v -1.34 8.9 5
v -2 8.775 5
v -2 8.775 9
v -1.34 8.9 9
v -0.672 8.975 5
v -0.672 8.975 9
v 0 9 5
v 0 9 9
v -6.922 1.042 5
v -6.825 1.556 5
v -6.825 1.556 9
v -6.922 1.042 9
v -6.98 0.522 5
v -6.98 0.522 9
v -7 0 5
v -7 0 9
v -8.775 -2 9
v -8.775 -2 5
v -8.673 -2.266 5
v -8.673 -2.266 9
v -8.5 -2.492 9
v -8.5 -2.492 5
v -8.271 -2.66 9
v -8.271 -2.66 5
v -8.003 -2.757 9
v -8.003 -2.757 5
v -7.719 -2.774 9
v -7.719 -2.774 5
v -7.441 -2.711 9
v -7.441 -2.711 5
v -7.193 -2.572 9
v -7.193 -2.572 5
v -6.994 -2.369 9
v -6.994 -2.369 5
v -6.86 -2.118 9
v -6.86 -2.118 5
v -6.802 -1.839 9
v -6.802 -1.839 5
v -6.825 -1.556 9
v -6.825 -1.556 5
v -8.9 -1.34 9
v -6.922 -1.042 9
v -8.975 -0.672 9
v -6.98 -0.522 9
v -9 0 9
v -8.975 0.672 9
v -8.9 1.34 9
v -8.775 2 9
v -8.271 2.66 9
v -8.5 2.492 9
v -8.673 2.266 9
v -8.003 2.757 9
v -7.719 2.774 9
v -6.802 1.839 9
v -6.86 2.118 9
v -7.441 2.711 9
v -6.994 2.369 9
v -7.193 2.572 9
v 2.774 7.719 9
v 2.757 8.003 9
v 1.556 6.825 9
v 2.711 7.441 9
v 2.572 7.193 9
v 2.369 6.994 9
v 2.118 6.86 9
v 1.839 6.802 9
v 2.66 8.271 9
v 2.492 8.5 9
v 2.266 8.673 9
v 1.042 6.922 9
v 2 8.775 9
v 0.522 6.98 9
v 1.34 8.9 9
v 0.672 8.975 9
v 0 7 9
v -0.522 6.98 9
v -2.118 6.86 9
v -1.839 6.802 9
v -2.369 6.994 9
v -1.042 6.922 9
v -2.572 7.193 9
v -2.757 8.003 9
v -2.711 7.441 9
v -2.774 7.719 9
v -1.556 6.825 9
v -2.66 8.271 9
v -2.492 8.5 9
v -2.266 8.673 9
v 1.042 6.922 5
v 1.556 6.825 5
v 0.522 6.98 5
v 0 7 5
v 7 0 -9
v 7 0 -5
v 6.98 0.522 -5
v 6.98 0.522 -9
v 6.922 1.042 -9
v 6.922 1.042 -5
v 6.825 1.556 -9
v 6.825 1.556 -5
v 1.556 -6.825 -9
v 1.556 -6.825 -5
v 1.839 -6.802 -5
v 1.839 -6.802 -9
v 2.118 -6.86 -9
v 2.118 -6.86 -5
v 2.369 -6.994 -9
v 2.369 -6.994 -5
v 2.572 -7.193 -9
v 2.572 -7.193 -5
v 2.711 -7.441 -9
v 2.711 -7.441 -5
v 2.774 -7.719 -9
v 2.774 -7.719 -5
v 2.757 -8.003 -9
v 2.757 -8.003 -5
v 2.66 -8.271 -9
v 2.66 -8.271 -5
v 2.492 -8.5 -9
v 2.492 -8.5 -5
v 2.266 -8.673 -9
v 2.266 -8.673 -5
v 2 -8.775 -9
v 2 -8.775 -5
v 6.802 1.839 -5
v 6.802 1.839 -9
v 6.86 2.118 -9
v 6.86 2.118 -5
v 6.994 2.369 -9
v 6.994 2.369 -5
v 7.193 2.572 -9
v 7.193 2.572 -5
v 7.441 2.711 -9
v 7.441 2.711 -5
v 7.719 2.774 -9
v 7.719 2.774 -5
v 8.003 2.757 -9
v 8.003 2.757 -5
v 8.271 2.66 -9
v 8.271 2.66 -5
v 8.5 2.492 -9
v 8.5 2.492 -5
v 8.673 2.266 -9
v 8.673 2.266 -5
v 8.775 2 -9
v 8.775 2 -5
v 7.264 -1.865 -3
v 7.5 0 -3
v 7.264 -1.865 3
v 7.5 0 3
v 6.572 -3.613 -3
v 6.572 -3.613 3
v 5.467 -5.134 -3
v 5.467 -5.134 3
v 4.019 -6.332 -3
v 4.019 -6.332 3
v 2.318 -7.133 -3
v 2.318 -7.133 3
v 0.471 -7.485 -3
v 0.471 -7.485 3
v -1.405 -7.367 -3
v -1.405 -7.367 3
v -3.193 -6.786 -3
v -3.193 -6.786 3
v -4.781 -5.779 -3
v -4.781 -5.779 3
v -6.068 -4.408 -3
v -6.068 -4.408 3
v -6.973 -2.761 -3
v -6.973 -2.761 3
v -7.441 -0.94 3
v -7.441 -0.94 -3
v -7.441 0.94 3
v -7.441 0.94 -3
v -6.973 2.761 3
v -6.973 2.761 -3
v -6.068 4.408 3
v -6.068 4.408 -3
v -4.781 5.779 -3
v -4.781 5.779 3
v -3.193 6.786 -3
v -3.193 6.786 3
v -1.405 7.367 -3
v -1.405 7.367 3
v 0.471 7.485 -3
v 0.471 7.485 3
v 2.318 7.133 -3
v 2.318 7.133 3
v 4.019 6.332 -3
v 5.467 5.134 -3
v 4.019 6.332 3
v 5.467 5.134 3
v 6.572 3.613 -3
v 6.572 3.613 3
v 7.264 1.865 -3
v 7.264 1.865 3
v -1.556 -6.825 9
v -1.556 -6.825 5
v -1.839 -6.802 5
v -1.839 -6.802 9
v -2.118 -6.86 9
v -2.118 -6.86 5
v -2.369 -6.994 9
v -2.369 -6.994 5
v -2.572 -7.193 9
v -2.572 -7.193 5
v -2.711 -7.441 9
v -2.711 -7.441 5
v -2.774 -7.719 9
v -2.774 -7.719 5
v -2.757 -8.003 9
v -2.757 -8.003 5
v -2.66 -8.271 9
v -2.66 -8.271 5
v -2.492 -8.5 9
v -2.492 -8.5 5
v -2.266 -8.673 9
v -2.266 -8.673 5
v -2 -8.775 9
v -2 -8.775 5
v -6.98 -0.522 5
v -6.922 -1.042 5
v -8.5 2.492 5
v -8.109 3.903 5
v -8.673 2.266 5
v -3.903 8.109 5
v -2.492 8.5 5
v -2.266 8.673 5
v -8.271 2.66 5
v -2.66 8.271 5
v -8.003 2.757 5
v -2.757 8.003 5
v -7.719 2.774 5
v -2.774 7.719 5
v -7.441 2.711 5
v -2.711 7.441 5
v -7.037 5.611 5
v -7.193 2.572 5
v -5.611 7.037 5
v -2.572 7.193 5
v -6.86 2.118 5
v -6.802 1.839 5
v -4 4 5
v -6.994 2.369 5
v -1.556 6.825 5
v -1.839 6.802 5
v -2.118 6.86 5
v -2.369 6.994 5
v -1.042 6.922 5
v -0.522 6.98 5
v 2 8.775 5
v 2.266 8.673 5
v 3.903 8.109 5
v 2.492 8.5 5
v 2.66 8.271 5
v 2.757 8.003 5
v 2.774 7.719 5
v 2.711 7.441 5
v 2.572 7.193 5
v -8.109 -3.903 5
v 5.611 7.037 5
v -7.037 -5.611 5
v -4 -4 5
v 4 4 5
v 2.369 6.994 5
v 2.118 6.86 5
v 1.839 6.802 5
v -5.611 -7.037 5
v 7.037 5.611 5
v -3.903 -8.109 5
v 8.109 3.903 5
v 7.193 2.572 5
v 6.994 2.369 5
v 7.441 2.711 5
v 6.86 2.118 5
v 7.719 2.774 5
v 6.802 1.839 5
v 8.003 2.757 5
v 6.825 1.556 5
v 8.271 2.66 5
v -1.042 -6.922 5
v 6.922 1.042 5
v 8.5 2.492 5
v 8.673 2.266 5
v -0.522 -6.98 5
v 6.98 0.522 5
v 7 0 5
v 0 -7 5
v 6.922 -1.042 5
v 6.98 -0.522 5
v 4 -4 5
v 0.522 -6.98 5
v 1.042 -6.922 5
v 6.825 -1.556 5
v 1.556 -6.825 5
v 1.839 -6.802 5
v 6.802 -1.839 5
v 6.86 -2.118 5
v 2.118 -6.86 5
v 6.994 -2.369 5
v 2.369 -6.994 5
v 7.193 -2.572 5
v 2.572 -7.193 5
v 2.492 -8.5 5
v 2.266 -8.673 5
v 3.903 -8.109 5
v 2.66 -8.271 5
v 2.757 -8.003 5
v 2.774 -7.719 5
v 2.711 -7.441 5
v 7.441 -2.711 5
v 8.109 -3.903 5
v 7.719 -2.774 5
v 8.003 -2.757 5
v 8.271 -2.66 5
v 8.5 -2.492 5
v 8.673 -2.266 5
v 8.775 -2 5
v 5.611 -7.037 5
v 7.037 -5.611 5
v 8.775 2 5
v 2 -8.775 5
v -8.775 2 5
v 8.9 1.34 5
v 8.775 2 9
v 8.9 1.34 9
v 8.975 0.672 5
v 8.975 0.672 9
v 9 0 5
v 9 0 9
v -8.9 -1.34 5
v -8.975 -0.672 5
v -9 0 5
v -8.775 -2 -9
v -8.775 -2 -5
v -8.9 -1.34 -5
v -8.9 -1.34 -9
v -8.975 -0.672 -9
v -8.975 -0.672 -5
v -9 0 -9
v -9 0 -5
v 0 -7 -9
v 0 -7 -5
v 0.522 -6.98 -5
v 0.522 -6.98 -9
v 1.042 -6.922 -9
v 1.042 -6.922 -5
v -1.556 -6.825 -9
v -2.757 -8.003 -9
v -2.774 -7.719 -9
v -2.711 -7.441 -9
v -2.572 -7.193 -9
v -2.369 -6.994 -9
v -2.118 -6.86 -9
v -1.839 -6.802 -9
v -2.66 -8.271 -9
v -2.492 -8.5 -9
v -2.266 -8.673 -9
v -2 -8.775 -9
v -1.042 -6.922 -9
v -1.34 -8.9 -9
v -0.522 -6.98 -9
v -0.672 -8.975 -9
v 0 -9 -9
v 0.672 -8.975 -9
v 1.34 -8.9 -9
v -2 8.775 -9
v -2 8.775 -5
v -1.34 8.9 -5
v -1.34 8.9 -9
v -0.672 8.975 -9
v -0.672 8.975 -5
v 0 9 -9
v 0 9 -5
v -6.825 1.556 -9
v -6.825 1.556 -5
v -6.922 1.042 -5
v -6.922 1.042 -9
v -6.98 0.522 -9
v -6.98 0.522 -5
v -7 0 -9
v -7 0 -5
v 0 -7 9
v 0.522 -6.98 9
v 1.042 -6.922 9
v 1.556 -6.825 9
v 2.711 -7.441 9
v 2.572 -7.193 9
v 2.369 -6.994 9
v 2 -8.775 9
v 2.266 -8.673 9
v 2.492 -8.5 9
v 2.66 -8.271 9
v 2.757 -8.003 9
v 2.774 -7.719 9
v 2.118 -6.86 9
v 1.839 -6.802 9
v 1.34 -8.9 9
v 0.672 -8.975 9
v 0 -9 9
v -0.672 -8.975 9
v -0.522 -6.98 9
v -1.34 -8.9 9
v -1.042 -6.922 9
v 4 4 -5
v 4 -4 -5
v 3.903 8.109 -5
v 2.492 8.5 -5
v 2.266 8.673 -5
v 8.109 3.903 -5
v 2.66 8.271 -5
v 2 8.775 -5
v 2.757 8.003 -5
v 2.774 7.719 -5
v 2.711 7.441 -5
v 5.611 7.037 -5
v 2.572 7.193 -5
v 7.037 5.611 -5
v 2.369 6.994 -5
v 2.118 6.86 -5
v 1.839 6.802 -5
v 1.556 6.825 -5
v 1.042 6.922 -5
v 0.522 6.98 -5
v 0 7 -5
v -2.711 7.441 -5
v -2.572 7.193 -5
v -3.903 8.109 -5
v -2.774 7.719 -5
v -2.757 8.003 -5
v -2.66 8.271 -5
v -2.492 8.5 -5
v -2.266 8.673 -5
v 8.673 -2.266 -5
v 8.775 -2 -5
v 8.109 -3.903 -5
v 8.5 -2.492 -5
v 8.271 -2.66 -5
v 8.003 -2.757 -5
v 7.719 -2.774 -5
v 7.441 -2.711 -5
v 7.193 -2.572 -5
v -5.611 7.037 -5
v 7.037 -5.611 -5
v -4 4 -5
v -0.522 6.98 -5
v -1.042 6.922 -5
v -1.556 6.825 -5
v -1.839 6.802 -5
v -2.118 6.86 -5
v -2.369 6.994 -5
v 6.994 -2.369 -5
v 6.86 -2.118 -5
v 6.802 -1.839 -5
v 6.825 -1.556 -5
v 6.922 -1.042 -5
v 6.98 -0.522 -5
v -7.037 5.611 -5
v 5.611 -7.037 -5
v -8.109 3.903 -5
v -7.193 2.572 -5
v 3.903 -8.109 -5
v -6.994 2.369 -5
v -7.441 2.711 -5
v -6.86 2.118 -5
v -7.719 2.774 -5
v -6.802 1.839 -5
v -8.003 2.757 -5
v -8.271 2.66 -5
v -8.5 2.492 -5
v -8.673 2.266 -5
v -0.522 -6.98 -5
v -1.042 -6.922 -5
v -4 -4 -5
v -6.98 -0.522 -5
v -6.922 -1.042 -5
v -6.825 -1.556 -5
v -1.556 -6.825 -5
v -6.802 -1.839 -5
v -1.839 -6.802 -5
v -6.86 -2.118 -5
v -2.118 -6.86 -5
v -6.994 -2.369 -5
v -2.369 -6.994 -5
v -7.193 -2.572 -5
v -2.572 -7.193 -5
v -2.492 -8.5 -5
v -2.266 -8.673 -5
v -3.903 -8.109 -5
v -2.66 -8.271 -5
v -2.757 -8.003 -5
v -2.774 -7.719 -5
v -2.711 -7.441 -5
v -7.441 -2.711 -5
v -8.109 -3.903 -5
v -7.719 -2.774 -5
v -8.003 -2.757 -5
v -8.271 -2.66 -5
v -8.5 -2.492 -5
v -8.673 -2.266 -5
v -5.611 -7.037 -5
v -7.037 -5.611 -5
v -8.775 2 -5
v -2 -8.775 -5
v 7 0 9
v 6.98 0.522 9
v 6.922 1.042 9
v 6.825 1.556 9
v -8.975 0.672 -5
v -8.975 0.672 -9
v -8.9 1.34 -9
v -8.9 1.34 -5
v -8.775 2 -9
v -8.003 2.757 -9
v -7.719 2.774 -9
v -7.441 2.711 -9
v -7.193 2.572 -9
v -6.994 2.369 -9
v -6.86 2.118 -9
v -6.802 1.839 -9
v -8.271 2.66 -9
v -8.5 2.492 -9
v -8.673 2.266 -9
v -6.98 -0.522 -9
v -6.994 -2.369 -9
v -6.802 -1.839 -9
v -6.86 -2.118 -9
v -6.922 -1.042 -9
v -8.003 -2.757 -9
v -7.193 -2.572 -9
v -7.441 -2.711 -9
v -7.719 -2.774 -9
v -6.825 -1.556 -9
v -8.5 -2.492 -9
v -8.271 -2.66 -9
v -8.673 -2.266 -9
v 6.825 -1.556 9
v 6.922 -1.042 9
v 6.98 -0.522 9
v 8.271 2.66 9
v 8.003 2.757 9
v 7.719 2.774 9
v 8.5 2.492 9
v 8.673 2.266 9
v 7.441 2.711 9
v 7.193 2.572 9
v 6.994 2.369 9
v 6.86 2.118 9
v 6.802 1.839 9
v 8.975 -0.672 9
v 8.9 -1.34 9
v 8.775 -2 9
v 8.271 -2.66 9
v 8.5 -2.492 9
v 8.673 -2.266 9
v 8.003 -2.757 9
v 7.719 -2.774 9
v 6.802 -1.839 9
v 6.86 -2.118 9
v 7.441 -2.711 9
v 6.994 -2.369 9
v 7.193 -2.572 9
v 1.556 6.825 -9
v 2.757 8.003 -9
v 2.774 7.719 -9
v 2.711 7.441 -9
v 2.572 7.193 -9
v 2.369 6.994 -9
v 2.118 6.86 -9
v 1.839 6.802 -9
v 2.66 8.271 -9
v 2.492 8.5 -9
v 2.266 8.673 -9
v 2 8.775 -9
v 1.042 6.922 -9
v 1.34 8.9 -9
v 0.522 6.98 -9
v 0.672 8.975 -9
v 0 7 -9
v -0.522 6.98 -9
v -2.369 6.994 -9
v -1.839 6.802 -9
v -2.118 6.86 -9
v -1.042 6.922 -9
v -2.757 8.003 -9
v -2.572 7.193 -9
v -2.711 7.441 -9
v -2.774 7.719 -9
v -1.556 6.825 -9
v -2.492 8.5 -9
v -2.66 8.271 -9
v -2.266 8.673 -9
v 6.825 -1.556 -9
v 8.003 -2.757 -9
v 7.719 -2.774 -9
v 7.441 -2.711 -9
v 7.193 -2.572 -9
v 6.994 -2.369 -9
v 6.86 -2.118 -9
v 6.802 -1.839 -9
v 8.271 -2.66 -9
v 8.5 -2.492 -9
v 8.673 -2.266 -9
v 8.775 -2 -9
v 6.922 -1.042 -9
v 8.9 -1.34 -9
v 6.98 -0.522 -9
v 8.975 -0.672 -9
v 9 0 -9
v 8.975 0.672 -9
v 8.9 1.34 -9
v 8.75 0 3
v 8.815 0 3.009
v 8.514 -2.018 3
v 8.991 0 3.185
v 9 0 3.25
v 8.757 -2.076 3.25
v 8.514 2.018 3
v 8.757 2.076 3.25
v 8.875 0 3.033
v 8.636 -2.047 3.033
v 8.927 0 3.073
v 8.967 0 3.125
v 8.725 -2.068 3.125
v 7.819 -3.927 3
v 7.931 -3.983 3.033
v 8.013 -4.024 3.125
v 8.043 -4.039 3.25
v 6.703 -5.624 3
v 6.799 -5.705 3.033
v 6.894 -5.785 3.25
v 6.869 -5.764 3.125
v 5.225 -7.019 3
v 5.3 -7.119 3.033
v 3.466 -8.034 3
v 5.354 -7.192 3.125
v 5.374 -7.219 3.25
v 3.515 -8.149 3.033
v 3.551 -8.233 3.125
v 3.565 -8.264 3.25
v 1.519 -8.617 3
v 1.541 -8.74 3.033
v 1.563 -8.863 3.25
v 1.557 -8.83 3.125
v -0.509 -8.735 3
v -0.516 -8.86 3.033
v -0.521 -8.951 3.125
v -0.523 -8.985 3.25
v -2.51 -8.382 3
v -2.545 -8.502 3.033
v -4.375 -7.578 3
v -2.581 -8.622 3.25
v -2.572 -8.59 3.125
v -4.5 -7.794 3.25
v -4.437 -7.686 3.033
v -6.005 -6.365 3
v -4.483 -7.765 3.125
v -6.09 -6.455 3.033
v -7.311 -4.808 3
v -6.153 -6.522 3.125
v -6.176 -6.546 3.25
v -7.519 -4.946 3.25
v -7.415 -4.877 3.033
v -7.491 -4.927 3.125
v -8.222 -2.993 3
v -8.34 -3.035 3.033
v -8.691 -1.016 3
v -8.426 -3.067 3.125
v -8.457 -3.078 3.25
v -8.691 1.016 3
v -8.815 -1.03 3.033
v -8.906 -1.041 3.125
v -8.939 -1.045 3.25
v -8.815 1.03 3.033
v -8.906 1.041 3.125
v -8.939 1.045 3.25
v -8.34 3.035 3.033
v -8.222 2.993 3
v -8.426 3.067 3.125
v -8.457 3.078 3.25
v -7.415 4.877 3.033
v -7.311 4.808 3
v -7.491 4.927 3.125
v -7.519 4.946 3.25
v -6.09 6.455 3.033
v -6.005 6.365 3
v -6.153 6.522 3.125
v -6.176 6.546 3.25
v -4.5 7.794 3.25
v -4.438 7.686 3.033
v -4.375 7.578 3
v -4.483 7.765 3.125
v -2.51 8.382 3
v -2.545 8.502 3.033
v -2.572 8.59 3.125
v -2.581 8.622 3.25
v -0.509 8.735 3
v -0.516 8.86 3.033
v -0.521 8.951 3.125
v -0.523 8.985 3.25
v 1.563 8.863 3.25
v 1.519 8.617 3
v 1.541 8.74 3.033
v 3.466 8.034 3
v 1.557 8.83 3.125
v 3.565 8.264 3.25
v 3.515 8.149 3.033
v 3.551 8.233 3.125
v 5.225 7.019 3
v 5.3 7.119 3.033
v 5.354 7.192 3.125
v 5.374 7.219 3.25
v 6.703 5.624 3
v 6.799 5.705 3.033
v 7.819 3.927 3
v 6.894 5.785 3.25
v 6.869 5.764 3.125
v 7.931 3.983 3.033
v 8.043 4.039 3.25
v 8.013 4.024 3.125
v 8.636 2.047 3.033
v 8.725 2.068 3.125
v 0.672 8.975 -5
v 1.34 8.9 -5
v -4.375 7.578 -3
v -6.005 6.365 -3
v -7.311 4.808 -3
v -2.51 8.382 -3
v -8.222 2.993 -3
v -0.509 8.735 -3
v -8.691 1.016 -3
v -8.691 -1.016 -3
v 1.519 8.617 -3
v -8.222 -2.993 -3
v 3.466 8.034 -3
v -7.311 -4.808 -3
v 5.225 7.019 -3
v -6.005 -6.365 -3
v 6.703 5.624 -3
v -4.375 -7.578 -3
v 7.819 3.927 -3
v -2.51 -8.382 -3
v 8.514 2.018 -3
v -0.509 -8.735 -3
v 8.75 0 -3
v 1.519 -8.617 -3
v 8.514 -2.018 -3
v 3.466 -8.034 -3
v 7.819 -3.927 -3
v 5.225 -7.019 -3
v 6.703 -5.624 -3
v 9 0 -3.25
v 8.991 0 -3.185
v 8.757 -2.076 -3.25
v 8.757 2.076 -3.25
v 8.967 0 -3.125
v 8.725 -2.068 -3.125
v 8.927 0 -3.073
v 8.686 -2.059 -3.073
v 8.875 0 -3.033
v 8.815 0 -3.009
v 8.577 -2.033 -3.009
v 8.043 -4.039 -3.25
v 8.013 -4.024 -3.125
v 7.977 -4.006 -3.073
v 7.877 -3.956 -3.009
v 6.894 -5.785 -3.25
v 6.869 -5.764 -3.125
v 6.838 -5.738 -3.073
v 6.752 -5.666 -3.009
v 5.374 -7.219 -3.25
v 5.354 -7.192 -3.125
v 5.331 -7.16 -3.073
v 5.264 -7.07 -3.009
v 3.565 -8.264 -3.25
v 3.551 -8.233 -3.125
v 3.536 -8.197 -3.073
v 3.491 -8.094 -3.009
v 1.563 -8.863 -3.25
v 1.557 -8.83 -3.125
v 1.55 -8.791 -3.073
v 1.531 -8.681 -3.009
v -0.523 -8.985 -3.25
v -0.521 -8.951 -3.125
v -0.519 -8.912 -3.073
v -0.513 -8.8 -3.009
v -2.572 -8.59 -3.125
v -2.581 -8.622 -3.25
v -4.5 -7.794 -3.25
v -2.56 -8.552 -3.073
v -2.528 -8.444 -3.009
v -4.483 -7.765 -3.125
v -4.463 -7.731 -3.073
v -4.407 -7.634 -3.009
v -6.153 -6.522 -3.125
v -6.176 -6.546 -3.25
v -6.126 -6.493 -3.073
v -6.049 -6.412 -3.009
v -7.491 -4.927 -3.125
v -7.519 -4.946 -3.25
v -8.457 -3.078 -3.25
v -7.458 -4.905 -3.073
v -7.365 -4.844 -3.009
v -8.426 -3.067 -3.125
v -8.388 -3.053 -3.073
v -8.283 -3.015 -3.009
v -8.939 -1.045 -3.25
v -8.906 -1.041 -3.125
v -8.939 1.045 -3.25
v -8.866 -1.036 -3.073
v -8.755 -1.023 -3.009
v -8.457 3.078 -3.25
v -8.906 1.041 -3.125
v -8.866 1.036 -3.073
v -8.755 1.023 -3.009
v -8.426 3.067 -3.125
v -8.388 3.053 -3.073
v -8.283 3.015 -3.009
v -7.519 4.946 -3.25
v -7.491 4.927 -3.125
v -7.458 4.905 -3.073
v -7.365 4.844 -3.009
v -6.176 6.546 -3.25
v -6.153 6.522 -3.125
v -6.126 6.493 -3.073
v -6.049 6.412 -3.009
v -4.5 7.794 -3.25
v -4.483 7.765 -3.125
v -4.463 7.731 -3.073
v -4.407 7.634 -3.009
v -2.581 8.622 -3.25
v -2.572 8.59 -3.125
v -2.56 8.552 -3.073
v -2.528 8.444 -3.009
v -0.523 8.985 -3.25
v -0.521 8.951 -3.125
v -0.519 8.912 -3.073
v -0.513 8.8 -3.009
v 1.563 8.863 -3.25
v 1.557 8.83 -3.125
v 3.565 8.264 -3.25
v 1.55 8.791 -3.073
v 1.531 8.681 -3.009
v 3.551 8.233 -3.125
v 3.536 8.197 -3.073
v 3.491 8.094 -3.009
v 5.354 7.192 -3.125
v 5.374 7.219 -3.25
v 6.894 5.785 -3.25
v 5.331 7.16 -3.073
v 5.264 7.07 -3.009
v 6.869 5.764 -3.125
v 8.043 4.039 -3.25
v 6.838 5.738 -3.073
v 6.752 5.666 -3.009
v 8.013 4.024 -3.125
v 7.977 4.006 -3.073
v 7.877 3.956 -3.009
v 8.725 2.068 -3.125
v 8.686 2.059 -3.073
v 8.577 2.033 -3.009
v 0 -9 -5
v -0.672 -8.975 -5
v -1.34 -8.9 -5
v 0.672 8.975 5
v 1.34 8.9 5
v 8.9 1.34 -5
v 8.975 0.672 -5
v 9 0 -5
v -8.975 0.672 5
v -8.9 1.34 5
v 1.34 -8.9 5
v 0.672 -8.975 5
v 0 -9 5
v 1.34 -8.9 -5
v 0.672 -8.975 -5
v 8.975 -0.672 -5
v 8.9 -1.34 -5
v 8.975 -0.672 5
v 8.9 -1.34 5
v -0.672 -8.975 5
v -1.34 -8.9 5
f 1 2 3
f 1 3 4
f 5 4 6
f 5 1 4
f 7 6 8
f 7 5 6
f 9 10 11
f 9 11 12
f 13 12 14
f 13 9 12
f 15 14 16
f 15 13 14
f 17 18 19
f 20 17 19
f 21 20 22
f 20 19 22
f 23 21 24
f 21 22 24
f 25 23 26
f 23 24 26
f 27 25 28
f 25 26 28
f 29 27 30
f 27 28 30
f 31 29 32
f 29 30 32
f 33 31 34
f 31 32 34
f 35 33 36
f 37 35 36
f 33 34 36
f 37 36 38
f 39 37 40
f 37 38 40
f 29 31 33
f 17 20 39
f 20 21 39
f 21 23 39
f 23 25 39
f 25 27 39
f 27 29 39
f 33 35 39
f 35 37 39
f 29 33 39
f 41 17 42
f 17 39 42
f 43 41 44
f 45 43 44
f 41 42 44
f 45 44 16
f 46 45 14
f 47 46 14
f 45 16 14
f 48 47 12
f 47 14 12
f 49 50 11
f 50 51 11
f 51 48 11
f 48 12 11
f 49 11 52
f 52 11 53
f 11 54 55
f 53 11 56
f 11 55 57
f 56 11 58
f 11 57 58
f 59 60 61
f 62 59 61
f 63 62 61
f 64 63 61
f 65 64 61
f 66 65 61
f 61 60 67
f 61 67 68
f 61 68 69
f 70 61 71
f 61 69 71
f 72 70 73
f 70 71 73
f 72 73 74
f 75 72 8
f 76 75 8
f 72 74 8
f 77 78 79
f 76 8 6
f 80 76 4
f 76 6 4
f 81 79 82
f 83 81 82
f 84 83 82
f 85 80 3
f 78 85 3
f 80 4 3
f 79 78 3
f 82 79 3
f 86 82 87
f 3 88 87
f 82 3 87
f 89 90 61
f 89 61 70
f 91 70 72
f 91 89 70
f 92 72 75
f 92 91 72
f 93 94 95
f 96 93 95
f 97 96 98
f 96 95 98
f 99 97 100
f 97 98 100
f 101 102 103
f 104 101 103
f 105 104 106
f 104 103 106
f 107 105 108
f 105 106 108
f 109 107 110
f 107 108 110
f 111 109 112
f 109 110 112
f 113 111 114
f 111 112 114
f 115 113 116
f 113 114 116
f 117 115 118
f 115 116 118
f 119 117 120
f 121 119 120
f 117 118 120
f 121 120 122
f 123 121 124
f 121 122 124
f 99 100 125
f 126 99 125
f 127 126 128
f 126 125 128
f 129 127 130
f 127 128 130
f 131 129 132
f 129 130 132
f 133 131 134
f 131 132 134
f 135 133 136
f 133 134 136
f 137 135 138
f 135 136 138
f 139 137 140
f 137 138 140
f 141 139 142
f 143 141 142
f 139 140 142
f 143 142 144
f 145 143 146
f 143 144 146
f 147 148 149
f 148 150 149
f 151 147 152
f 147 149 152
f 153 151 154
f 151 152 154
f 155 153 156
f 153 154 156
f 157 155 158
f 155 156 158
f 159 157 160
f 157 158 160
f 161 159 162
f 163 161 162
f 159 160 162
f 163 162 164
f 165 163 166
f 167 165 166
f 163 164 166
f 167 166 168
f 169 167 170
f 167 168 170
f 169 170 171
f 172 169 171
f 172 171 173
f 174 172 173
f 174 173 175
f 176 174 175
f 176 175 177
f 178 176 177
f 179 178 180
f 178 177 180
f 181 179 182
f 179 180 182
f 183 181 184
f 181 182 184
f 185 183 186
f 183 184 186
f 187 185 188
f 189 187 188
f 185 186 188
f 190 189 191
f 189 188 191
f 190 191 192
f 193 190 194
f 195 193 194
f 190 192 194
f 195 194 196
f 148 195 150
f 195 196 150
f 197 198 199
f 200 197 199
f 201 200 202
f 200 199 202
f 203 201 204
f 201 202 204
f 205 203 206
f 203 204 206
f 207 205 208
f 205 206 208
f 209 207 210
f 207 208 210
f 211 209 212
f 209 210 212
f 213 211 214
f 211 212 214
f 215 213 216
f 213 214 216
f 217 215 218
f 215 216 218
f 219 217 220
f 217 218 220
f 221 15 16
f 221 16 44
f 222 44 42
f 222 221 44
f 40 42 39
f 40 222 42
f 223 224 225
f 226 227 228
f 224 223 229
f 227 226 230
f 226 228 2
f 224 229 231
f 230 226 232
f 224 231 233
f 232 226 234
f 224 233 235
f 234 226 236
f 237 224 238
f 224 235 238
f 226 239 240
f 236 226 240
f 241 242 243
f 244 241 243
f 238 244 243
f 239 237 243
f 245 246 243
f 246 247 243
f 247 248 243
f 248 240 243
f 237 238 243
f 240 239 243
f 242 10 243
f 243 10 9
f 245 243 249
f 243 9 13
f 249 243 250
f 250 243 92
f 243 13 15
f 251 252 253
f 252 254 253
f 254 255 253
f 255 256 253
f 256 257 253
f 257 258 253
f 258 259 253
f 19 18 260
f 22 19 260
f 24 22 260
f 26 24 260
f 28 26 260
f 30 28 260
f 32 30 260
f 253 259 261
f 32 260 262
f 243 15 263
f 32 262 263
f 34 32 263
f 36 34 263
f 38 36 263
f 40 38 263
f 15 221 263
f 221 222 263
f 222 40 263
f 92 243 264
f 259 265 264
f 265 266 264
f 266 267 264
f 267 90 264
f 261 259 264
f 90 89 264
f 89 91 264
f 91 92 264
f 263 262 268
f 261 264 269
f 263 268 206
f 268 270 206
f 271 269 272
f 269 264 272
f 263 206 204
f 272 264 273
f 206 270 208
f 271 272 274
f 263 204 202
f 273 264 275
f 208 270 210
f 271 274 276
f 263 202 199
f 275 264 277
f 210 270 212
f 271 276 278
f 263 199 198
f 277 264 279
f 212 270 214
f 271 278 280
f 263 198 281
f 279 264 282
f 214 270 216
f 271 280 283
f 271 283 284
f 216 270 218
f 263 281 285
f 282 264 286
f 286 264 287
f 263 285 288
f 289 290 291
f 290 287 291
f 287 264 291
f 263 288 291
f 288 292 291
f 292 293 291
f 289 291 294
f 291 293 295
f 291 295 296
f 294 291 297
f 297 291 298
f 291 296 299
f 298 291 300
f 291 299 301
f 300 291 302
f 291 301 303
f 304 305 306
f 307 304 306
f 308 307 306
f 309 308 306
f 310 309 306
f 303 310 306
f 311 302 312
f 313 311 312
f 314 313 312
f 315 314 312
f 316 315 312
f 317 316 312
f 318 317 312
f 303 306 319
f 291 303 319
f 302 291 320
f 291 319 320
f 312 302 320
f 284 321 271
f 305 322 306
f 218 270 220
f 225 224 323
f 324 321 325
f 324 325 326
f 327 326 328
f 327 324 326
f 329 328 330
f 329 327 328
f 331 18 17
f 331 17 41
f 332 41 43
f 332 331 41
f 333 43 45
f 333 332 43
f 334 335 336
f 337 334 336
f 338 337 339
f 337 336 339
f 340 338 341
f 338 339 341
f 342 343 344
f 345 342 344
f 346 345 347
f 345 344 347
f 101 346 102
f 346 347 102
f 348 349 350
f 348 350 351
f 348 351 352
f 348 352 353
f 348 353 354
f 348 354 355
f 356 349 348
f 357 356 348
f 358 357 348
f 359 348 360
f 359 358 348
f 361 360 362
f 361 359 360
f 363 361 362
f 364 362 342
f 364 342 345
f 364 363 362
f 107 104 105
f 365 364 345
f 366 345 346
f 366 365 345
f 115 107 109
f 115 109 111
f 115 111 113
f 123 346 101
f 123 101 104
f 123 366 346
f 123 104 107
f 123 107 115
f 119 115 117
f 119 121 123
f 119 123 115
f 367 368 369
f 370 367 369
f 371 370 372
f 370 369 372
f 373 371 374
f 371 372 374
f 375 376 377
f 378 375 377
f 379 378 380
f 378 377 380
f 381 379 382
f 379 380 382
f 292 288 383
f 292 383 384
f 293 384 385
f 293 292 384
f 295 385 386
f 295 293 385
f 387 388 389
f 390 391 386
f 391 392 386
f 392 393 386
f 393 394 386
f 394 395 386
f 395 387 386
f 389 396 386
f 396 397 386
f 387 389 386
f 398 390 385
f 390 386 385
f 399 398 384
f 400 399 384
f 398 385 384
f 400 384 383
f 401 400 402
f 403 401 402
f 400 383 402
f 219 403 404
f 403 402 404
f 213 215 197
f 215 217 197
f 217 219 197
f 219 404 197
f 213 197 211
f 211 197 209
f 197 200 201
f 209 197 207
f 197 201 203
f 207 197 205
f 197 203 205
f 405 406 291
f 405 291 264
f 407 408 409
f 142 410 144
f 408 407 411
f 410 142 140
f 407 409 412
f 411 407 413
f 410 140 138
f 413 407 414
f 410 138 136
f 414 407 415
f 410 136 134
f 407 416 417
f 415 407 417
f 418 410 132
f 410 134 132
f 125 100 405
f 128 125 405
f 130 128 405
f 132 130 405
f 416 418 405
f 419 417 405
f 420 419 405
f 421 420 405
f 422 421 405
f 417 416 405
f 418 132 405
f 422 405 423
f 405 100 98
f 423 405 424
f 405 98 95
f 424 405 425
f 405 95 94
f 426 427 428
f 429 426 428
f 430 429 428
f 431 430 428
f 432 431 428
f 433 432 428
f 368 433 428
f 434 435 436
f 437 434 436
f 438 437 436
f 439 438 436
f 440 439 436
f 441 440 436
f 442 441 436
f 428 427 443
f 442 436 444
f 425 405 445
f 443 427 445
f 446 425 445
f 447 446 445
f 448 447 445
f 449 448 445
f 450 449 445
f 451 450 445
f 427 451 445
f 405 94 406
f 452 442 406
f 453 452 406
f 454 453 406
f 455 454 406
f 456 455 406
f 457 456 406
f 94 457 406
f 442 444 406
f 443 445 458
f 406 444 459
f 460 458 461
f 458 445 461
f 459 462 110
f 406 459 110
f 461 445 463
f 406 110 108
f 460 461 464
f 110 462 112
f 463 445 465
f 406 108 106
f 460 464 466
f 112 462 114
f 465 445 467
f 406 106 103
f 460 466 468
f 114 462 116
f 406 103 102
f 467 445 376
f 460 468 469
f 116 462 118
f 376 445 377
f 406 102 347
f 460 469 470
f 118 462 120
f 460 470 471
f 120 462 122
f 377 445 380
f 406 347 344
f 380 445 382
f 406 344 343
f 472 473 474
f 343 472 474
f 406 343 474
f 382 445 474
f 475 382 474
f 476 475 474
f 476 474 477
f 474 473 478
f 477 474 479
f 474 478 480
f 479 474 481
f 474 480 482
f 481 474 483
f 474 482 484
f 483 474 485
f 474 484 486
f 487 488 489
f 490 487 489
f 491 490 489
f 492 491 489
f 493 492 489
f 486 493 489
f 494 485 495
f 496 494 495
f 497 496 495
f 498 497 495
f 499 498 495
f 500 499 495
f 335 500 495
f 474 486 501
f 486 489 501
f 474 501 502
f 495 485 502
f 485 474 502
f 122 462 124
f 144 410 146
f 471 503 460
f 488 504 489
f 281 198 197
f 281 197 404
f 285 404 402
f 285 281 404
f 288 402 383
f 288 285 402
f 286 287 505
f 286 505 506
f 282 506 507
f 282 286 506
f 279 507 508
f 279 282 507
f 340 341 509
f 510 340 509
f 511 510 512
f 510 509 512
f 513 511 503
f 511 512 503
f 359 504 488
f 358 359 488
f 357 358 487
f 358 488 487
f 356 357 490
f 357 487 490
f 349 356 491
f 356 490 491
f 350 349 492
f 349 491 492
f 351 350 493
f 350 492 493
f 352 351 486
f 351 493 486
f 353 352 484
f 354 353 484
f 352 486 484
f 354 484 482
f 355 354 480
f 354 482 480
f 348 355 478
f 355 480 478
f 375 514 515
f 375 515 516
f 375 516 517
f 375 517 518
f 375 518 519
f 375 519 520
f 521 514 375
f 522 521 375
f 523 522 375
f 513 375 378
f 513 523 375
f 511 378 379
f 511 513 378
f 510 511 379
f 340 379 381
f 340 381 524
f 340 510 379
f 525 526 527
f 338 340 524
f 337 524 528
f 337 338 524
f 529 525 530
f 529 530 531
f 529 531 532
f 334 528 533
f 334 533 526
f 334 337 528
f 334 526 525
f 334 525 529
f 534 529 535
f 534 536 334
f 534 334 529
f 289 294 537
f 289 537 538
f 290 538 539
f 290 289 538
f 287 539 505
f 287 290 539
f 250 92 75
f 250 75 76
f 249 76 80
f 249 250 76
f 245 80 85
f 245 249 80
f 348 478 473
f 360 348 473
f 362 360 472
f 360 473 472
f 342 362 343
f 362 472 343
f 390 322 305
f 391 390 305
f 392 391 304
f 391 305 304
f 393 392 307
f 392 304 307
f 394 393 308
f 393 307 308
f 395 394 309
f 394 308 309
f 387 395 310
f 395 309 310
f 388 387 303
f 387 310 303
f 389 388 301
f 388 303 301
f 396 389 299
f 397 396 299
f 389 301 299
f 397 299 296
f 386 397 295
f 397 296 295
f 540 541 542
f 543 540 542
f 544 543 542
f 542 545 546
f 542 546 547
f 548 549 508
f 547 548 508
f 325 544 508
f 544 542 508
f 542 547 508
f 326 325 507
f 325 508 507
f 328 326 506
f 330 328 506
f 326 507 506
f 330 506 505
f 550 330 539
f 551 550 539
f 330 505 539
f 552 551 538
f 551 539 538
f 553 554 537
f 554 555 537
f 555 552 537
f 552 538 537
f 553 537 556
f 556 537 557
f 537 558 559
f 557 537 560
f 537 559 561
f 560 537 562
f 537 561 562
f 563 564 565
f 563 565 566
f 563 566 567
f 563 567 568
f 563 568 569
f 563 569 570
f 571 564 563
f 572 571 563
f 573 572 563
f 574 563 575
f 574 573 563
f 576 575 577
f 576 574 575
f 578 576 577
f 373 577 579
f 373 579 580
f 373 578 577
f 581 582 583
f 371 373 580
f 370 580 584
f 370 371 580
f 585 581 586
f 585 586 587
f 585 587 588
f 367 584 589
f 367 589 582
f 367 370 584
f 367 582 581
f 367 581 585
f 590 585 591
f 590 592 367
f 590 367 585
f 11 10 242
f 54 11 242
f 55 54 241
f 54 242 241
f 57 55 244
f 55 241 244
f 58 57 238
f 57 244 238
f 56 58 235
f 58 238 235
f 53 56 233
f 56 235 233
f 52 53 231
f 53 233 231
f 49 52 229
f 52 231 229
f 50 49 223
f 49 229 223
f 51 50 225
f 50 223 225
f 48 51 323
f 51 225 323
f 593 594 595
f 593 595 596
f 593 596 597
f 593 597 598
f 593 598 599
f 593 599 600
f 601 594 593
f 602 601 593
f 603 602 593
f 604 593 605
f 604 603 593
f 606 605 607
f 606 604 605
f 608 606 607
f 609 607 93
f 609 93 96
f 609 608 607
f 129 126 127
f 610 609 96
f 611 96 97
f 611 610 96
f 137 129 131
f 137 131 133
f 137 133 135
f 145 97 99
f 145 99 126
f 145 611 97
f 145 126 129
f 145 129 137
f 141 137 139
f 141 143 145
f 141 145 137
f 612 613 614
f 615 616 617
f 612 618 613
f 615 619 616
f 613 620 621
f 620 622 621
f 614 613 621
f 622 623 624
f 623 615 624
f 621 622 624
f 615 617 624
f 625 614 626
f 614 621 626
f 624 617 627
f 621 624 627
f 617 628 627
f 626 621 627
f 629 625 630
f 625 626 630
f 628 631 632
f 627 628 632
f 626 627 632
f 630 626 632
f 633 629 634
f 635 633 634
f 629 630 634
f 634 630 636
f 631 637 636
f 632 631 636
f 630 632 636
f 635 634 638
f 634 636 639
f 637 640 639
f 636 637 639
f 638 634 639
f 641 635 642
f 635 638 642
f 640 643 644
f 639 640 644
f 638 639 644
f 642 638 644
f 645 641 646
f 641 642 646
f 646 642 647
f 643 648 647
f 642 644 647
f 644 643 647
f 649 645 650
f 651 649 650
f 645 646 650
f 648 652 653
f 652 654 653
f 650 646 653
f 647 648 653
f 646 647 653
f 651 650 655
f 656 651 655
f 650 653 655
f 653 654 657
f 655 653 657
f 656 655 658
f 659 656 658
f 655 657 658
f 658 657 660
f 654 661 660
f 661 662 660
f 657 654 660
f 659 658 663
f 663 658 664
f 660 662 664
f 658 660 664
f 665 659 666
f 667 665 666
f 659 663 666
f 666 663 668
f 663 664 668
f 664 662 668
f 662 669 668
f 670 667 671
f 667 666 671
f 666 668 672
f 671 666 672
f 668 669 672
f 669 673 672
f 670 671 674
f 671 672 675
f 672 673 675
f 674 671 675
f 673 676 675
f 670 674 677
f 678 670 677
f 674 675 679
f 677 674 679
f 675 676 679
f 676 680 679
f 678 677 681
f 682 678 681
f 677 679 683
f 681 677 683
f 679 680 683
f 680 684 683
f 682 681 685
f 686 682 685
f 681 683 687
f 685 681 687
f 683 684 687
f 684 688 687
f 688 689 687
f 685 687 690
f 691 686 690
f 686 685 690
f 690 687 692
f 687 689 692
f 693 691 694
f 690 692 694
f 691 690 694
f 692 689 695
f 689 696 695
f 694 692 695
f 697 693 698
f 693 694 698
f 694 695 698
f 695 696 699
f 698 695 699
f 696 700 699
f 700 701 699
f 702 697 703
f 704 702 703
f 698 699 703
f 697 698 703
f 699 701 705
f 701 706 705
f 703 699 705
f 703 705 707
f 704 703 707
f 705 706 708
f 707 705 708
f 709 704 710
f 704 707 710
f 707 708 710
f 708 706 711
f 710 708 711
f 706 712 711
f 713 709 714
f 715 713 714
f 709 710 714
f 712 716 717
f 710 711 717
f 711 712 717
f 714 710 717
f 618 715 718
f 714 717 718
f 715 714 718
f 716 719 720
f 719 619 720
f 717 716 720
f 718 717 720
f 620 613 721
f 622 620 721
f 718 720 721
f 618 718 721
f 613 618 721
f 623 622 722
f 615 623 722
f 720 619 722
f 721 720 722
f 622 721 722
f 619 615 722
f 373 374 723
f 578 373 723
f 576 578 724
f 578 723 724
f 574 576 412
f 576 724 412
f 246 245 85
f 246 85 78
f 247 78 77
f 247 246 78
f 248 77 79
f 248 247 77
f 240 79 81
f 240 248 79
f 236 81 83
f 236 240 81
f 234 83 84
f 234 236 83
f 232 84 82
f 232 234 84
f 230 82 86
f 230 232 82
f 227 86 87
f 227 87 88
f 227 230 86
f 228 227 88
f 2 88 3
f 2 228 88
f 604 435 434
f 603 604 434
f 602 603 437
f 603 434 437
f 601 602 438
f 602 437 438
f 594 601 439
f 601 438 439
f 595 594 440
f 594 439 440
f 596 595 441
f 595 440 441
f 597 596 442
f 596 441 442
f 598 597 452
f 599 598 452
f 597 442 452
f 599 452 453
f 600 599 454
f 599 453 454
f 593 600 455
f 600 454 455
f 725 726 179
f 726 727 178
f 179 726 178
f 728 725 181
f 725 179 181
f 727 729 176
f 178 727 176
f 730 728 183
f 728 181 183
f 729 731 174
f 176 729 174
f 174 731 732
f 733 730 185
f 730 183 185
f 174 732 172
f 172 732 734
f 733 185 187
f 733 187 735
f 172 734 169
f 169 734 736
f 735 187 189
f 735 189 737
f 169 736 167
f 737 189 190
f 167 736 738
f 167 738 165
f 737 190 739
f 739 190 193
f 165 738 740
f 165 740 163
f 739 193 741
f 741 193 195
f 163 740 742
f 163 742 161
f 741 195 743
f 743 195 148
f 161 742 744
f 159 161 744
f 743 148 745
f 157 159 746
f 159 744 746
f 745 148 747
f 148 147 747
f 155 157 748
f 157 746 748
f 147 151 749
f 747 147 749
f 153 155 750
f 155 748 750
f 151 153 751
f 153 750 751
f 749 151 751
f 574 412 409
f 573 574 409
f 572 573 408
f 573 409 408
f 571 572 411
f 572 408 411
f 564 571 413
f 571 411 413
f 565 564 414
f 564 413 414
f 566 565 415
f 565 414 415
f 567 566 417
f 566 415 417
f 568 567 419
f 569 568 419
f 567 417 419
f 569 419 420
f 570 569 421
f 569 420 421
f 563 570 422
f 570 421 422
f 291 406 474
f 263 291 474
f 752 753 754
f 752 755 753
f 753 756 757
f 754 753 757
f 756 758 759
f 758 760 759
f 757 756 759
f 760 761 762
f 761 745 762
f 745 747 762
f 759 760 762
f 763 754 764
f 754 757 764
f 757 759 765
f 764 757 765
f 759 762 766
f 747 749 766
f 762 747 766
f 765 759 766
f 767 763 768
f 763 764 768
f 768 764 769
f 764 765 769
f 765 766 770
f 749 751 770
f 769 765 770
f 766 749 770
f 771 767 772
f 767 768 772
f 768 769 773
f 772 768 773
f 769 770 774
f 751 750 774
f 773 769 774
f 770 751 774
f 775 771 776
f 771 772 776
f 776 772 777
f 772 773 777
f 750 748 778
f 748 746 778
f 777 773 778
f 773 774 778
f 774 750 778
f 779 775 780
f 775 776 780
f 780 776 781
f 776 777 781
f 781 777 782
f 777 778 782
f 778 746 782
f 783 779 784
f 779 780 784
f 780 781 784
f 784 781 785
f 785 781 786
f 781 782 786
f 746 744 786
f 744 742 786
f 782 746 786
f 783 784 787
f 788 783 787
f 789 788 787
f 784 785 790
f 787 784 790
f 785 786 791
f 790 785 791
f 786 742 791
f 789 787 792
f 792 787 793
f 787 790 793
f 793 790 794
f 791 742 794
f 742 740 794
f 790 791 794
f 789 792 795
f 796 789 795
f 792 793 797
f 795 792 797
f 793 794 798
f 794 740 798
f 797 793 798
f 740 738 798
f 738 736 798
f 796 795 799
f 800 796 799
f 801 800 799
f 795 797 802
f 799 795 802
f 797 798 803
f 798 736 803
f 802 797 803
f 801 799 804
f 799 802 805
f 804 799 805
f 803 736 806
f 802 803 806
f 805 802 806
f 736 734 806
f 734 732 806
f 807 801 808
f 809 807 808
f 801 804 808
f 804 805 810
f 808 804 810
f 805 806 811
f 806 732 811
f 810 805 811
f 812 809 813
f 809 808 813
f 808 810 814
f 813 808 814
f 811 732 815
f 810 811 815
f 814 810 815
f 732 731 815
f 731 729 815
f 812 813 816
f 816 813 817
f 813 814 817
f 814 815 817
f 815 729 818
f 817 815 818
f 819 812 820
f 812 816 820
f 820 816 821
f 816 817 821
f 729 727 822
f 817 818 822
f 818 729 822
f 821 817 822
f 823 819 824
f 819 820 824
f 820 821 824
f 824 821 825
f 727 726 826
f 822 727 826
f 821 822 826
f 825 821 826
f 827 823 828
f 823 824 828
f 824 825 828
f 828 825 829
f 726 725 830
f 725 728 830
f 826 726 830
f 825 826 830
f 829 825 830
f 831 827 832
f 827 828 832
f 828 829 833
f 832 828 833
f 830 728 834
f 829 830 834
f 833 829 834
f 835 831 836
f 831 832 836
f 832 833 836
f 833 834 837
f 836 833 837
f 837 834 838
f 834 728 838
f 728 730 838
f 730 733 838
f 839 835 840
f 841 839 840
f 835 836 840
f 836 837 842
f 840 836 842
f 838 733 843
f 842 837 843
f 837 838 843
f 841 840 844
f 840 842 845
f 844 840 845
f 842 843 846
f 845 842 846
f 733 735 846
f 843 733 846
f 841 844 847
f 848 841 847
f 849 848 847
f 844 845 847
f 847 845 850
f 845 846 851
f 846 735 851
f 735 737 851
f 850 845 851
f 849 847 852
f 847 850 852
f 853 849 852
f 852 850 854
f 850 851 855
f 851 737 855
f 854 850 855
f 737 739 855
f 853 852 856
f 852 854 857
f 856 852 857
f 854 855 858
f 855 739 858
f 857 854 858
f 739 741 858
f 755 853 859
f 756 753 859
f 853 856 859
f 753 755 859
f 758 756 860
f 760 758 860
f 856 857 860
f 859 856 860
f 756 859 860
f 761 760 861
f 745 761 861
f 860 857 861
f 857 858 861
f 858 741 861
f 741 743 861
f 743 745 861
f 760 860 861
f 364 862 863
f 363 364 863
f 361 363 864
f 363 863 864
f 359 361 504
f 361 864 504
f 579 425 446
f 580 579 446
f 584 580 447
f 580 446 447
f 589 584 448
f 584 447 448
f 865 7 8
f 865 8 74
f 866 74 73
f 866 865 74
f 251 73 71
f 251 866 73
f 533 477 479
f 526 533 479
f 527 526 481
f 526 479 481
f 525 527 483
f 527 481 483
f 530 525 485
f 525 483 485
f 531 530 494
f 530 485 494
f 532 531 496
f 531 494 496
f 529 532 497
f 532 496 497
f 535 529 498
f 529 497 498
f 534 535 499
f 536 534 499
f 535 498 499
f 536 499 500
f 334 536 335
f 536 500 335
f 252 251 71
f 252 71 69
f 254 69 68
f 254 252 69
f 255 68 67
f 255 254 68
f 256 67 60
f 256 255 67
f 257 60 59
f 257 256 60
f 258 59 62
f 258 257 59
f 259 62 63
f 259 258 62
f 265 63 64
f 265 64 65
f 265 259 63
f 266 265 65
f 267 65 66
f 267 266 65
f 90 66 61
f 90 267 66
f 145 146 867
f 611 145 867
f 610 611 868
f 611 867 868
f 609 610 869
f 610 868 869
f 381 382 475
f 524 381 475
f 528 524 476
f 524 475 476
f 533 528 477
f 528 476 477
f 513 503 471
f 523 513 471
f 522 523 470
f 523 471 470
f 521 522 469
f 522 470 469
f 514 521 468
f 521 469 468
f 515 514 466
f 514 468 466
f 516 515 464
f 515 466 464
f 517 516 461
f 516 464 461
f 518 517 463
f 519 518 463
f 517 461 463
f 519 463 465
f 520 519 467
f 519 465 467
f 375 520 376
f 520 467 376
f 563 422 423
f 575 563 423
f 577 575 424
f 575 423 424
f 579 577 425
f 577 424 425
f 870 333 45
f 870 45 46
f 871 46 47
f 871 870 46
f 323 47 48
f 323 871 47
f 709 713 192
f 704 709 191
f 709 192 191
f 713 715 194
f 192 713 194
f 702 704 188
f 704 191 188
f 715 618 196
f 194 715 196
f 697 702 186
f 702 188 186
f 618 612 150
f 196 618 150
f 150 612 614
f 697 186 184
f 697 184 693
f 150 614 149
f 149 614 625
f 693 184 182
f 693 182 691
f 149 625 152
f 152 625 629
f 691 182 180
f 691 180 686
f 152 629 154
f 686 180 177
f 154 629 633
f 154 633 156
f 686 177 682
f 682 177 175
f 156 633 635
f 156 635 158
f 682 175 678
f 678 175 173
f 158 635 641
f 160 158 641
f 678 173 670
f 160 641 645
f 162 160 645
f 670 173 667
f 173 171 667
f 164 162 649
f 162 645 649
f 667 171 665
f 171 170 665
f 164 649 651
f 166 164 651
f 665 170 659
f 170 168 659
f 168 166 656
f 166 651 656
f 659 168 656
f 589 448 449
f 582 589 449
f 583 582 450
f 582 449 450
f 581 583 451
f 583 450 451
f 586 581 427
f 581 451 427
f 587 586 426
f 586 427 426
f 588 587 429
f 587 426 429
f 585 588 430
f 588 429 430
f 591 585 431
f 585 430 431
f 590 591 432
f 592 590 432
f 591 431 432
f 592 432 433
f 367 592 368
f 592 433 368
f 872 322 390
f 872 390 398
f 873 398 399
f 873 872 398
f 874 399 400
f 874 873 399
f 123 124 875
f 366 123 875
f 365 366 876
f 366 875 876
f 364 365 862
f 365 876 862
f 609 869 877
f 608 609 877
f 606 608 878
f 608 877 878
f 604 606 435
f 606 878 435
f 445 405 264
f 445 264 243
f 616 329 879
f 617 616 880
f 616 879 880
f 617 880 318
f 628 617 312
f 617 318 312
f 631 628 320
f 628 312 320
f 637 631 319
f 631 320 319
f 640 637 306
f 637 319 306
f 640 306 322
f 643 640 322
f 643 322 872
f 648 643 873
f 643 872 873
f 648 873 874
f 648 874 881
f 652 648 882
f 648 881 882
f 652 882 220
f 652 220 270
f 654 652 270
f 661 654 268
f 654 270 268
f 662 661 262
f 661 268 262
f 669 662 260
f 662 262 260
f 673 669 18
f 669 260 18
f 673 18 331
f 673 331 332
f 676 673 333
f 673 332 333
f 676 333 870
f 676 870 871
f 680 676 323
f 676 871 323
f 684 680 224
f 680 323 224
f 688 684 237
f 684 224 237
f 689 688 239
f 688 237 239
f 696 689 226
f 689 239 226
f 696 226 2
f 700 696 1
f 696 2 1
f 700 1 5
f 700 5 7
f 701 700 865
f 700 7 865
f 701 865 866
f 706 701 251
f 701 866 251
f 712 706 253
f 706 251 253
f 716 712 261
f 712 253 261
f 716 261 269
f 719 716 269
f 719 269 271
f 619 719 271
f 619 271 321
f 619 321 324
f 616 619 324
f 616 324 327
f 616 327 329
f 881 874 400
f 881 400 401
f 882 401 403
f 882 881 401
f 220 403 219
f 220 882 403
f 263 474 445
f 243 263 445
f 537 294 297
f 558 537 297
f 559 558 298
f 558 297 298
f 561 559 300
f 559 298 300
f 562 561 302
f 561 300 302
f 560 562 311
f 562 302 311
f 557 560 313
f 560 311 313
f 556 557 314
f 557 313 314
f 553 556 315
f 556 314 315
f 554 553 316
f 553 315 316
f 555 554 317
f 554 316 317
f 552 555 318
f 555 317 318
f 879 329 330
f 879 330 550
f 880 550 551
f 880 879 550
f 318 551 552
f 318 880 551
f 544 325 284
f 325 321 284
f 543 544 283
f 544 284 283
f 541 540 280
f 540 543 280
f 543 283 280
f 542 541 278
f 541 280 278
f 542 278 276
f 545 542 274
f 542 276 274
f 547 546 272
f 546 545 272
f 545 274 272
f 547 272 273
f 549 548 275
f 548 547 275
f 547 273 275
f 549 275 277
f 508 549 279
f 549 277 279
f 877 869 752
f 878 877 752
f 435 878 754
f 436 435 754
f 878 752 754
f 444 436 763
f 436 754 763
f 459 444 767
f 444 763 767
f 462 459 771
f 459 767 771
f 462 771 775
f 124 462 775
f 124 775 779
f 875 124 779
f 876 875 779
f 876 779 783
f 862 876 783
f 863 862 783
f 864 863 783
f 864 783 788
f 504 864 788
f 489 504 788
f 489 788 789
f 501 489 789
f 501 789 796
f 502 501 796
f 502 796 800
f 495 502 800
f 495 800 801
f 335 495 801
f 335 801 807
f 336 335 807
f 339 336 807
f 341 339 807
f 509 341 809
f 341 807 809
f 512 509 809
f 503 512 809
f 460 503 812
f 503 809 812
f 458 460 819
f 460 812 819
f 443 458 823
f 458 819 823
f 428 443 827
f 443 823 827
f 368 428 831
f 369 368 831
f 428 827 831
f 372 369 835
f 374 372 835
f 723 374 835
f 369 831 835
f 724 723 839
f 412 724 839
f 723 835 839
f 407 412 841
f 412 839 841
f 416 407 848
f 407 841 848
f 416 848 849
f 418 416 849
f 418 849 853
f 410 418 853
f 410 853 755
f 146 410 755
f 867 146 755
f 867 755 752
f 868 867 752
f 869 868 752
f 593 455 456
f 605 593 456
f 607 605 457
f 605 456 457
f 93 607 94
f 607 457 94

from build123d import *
from build123d.topology import SkipClean

# Parameters (mm, degrees)
FILLET2_R               = 0.25
SKETCH3_R               = 1
BOSS_EXTRUDE1_DEPTH     = 4
CIRPATTERN1_COUNT       = 4
MIRROR1_COPY_1_SKETCH_R = 1
MIRROR1_COPY_1_DEPTH    = 4
MIRROR1_COPY_2_SKETCH_R = 1
MIRROR1_COPY_2_DEPTH    = 4
MIRROR1_COPY_3_SKETCH_R = 1
MIRROR1_COPY_3_DEPTH    = 4
CUT_EXTRUDE1_REACH      = 20.921
SKETCH4_W               = 8
SKETCH4_H               = 8


with BuildPart() as part:
    # Sketch2 → Revolve1 (revolve)
    with BuildSketch(Plane(origin=(0, 0, 0), x_dir=(0, 0, -1), z_dir=(1, 0, 0)), mode=Mode.PRIVATE) as revolve1_sk:
        Polygon((-5, 9), (-5, 0), (0, 0), (0, 7.5), (-3, 7.5), (-3, 9), align=None)
        Polygon((0, 7.5), (0, 0), (5, 0), (5, 9), (3, 9), (3, 7.5), align=None)
    revolve(revolve1_sk.sketch.rotate(Axis((0, 0, 0), (0, 0, -1)), 90), axis=Axis((0, 0, 0), (0, 0, -1)))

    # Fillet2
    fillet2_edges = [part.edges().sort_by_distance(p)[0] for p in [
        (-9, 0, -3),
        (-9, 0, 3),
    ]]
    fillet(fillet2_edges, radius=FILLET2_R)

    # Sketch3 → Boss-Extrude1 (add)
    with BuildSketch(Plane(origin=(0, 0, -5), x_dir=(-1, 0, 0), z_dir=(0, 0, -1))):
        with BuildLine():
            ThreePointArc((2, 8.774964387), (1.006310219, 8.943564152), (0, 9))
            ThreePointArc((0, 9), (-1.006310219, 8.943564152), (-2, 8.774964387))
            ThreePointArc((-2, 8.774964387), (-1.154168213, 8.581704304), (-0.777777778, 7.799968344))
            ThreePointArc((-0.777777778, 7.799968344), (-0.996041818, 7.17635878), (-1.555555556, 6.824972301))
            ThreePointArc((-1.555555556, 6.824972301), (-0.782685726, 6.956105452), (0, 7))
            ThreePointArc((0, 7), (0.782685726, 6.956105452), (1.555555556, 6.824972301))
            ThreePointArc((1.555555556, 6.824972301), (0.802781735, 8.022190567), (2, 8.774964387))
        make_face()
        with Locations((-1.777777778, 7.799968344)):
            Circle(SKETCH3_R)
        with Locations((1.777777778, 7.799968344)):
            Circle(SKETCH3_R)
    boss_extrude1 = extrude(amount=BOSS_EXTRUDE1_DEPTH)

    # CirPattern1: Boss-Extrude1 ×4 about axis
    cirpattern1_axis = Axis((0, 0, 0), (0, 0, 1))
    for i in range(1, CIRPATTERN1_COUNT):
        add(boss_extrude1.rotate(cirpattern1_axis, i * 360 / CIRPATTERN1_COUNT))

    # Mirror1: Boss-Extrude1 across plane
    add(boss_extrude1.mirror(Plane.XY))

    # Mirror1 copy 1 sketch → Mirror1 copy 1 (add)
    with BuildSketch(Plane(origin=(0, 0, 5), x_dir=(0, -1, 0), z_dir=(0, 0, 1))):
        with BuildLine():
            ThreePointArc((2, -8.774964387), (1.006310219, -8.943564152), (0, -9))
            ThreePointArc((0, -9), (-1.006310219, -8.943564152), (-2, -8.774964387))
            ThreePointArc((-2, -8.774964387), (-1.154168213, -8.581704304), (-0.777777778, -7.799968344))
            ThreePointArc((-0.777777778, -7.799968344), (-0.996041818, -7.17635878), (-1.555555556, -6.824972301))
            ThreePointArc((-1.555555556, -6.824972301), (-0.782685726, -6.956105452), (0, -7))
            ThreePointArc((0, -7), (0.782685726, -6.956105452), (1.555555556, -6.824972301))
            ThreePointArc((1.555555556, -6.824972301), (0.802781735, -8.022190567), (2, -8.774964387))
        make_face()
        with Locations((-1.777777778, -7.799968344)):
            Circle(MIRROR1_COPY_1_SKETCH_R)
        with Locations((1.777777778, -7.799968344)):
            Circle(MIRROR1_COPY_1_SKETCH_R)
    extrude(amount=MIRROR1_COPY_1_DEPTH)

    # Mirror1 copy 2 sketch → Mirror1 copy 2 (add)
    with BuildSketch(Plane.XY.offset(5)):
        with BuildLine():
            ThreePointArc((2, -8.774964387), (1.006310219, -8.943564152), (0, -9))
            ThreePointArc((0, -9), (-1.006310219, -8.943564152), (-2, -8.774964387))
            ThreePointArc((-2, -8.774964387), (-1.154168213, -8.581704304), (-0.777777778, -7.799968344))
            ThreePointArc((-0.777777778, -7.799968344), (-0.996041818, -7.17635878), (-1.555555556, -6.824972301))
            ThreePointArc((-1.555555556, -6.824972301), (-0.782685726, -6.956105452), (0, -7))
            ThreePointArc((0, -7), (0.782685726, -6.956105452), (1.555555556, -6.824972301))
            ThreePointArc((1.555555556, -6.824972301), (0.802781735, -8.022190567), (2, -8.774964387))
        make_face()
        with Locations((-1.777777778, -7.799968344)):
            Circle(MIRROR1_COPY_2_SKETCH_R)
        with Locations((1.777777778, -7.799968344)):
            Circle(MIRROR1_COPY_2_SKETCH_R)
    extrude(amount=MIRROR1_COPY_2_DEPTH)

    # Mirror1 copy 3 sketch → Mirror1 copy 3 (add)
    with SkipClean():  # the faces are left unmerged after this step: merging them gives an invalid solid
        with BuildSketch(Plane(origin=(0, 0, 5), x_dir=(0, 1, 0), z_dir=(0, 0, 1))):
            with BuildLine():
                ThreePointArc((2, -8.774964387), (1.006310219, -8.943564152), (0, -9))
                ThreePointArc((0, -9), (-1.006310219, -8.943564152), (-2, -8.774964387))
                ThreePointArc((-2, -8.774964387), (-1.154168213, -8.581704304), (-0.777777778, -7.799968344))
                ThreePointArc((-0.777777778, -7.799968344), (-0.996041818, -7.17635878), (-1.555555556, -6.824972301))
                ThreePointArc((-1.555555556, -6.824972301), (-0.782685726, -6.956105452), (0, -7))
                ThreePointArc((0, -7), (0.782685726, -6.956105452), (1.555555556, -6.824972301))
                ThreePointArc((1.555555556, -6.824972301), (0.802781735, -8.022190567), (2, -8.774964387))
            make_face()
            with Locations((-1.777777778, -7.799968344)):
                Circle(MIRROR1_COPY_3_SKETCH_R)
            with Locations((1.777777778, -7.799968344)):
                Circle(MIRROR1_COPY_3_SKETCH_R)
        extrude(amount=MIRROR1_COPY_3_DEPTH)

    # Sketch4 → Cut-Extrude1 (cut, up to next)
    with BuildSketch(Plane(origin=(0, 0, -5), x_dir=(-1, 0, 0), z_dir=(0, 0, -1)), mode=Mode.PRIVATE) as cut_extrude1_sk1:
        Rectangle(SKETCH4_W, SKETCH4_H)
    cut_extrude1_tool1 = extrude(cut_extrude1_sk1.sketch, amount=-CUT_EXTRUDE1_REACH, mode=Mode.PRIVATE) & part.part
    add(cut_extrude1_tool1.solids().sort_by_distance((0, 0, -5))[0], mode=Mode.SUBTRACT)


solid = part.part
